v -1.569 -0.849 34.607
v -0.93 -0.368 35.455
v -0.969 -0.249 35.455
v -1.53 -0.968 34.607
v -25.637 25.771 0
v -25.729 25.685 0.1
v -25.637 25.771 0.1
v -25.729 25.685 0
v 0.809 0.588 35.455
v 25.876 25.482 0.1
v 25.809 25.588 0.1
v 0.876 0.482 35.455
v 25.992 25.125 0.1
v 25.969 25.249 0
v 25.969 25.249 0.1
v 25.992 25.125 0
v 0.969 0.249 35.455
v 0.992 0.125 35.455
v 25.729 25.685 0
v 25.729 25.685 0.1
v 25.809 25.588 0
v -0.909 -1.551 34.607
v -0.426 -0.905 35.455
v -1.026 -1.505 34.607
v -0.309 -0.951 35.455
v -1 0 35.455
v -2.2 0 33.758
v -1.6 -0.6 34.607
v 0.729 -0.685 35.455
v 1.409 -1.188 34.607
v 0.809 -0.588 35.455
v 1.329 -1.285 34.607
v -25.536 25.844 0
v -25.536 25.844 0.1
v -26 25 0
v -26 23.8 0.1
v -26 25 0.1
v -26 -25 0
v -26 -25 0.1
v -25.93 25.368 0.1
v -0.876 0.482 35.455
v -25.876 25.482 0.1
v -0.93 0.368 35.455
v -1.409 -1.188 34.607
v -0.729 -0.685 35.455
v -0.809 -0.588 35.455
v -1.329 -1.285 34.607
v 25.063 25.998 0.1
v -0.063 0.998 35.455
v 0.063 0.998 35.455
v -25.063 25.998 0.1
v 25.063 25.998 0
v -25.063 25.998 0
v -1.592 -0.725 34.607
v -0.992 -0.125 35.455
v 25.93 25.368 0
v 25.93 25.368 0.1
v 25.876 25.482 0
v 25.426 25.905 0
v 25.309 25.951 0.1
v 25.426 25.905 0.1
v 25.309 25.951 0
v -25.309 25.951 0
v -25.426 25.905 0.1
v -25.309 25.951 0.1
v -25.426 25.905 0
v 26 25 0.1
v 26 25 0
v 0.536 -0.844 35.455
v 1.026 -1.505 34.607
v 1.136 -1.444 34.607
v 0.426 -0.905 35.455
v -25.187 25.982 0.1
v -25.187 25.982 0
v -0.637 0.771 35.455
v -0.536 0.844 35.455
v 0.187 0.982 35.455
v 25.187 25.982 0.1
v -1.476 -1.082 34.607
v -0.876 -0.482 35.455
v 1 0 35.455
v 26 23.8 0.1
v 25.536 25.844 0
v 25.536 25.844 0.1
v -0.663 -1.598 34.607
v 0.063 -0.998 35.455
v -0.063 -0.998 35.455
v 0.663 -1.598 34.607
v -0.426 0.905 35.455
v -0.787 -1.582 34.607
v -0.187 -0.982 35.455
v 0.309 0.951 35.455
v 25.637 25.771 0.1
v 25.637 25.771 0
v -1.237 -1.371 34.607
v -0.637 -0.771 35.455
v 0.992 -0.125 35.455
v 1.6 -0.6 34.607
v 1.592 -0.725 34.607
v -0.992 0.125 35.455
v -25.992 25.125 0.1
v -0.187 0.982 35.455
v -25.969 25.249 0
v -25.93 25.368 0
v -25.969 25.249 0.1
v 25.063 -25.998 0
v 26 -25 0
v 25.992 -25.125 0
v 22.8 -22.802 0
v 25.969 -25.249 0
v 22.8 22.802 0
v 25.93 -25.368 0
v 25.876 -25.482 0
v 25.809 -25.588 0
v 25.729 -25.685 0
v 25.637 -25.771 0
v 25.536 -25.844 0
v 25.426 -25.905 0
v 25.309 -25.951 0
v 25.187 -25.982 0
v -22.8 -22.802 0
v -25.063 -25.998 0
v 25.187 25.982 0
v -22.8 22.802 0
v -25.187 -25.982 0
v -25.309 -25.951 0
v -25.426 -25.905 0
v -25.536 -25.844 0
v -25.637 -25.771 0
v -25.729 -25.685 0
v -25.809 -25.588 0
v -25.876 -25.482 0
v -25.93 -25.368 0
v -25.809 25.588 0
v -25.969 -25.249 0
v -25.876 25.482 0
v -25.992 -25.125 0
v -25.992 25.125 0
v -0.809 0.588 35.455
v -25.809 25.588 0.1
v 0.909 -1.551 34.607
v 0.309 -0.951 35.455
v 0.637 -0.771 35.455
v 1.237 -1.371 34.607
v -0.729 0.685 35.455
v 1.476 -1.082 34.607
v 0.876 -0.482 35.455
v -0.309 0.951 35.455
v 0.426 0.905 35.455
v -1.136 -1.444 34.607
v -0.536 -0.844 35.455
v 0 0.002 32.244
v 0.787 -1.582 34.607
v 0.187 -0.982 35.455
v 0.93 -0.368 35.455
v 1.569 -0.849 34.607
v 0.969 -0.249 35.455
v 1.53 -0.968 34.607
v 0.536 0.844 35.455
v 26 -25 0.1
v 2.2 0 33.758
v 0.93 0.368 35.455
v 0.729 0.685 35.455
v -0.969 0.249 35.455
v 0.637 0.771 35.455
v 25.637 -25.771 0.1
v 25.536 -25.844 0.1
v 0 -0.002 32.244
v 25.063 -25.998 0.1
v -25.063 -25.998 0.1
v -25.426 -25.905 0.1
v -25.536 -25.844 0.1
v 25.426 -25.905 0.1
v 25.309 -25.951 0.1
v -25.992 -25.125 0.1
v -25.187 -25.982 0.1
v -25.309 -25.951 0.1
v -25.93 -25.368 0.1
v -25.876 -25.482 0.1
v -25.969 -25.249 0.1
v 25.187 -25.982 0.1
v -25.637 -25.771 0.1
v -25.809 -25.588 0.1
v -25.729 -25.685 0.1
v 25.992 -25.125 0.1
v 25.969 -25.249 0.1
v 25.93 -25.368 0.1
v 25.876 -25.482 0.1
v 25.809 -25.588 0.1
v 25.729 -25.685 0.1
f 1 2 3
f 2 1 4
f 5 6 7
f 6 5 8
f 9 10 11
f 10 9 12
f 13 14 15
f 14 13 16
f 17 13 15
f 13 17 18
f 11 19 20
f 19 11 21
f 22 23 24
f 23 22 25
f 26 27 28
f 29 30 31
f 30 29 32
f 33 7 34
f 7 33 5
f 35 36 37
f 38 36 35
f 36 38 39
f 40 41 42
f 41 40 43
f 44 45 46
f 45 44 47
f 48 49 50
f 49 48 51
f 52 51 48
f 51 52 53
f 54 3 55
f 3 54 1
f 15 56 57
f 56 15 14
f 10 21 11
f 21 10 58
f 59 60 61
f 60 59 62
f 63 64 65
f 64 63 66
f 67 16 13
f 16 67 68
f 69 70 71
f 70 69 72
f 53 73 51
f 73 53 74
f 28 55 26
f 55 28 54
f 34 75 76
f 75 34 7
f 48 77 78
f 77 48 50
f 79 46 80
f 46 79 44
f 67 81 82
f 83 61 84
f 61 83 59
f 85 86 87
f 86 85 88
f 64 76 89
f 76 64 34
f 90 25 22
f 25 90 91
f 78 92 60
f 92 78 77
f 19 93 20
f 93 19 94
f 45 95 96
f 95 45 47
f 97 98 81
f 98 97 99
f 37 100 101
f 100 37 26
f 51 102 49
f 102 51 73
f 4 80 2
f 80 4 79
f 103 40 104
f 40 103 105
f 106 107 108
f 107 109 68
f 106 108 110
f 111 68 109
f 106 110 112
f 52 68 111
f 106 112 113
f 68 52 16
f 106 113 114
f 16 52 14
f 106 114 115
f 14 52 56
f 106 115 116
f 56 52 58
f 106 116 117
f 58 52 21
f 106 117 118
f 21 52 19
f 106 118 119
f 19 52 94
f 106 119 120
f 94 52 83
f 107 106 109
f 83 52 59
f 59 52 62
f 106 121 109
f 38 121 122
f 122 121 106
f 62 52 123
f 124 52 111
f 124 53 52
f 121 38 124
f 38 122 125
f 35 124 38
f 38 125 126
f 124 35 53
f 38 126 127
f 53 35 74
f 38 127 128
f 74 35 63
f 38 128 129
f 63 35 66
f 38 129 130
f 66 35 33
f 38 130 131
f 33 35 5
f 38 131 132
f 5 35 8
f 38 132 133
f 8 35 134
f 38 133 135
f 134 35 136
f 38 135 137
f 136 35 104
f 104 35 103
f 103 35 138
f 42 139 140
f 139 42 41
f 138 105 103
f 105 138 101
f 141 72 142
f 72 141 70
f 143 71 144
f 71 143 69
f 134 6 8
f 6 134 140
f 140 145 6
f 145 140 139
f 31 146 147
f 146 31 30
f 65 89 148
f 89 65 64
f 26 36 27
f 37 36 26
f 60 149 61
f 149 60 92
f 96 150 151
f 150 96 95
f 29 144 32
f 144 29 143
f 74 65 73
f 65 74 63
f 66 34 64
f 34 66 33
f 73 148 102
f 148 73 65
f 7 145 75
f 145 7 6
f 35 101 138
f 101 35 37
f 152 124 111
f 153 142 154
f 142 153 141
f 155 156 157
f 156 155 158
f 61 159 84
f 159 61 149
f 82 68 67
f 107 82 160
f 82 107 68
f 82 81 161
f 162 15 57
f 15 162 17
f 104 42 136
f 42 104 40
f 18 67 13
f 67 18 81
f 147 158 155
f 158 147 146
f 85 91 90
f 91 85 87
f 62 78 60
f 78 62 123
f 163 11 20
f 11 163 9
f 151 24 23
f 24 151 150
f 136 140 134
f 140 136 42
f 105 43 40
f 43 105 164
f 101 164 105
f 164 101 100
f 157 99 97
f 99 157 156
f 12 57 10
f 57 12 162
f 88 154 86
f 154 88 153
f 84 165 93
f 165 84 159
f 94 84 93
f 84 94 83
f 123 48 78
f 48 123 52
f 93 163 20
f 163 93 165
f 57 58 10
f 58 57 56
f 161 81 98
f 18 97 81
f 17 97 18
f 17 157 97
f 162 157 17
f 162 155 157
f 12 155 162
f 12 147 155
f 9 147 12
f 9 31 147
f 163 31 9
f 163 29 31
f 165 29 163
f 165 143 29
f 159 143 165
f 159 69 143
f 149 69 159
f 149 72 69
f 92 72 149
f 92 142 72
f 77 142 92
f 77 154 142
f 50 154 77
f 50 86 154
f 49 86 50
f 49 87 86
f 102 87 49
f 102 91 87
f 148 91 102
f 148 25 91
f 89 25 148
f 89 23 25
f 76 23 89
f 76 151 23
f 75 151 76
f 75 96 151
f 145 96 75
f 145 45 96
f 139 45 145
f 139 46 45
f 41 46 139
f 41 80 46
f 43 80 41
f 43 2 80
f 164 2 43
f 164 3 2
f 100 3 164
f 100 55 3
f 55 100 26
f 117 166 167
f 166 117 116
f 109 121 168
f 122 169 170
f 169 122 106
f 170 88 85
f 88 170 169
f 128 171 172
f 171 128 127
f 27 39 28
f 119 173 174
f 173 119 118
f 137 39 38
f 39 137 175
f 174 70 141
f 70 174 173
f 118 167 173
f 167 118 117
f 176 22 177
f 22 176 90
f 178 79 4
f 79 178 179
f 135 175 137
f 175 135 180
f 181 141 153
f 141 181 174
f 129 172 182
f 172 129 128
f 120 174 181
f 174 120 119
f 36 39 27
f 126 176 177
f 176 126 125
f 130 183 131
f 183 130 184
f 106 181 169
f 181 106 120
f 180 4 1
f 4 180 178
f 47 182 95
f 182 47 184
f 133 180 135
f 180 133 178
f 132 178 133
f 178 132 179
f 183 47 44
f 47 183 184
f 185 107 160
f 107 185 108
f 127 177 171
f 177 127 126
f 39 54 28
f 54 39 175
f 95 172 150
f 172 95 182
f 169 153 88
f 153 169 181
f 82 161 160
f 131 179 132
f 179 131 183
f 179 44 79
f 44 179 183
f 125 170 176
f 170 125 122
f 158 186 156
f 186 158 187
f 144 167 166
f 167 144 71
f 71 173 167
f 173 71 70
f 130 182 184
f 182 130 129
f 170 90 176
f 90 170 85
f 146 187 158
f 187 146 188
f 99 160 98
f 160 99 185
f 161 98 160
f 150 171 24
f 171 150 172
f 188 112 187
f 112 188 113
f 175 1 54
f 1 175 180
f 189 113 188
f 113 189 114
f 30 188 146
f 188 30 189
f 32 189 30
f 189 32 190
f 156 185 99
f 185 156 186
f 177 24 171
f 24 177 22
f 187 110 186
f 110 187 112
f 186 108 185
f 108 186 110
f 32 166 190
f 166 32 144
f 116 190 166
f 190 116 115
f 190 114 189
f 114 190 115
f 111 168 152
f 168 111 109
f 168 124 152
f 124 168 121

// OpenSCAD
//
// The octahedron consists of two hollow pyramids which can be glued together later on.
//

outside_base_edge_length = 50; // 50 mm
wall_thickness = 1.2;          // 1.2 mm
add_hole_for_hanging = false;  // false by default, can be set to true for the upper pyramid of octahedron so that the final octahedron can be hung on a string

outside_height = (outside_base_edge_length / 2.0) * sqrt(2.0);

module outside_pyramid() {
    linear_extrude(height = outside_height, center = false, convexity = 10, twist = 0, scale = 0, $fn = 100)
    square([outside_base_edge_length, outside_base_edge_length], center = true);
}

module inside_pyramid(wall_thickness_) {
    inside_base_edge_length = outside_base_edge_length - (2.0 * wall_thickness_);
    inside_height = (inside_base_edge_length / 2.0) * sqrt(2.0);

    linear_extrude(height = inside_height, center = false, convexity = 10, twist = 0, scale = 0, $fn = 100)
    square([inside_base_edge_length, inside_base_edge_length], center = true);
}

$fn=50;
module hollow_pyramid() {
    minkowski() {
        cylinder(r=1, h=0.1);
        difference() {
            outside_pyramid();
            inside_pyramid(wall_thickness);
        }
    }
}

if(add_hole_for_hanging) {
    difference() {
        hollow_pyramid();
        translate ([0, outside_base_edge_length / 2.0, 0.8 * outside_height]) rotate ([90, 0, 0]) cylinder (h = outside_base_edge_length, r = 1.0, center = false, $fn = 100);
    }
} else {
    hollow_pyramid();
}
